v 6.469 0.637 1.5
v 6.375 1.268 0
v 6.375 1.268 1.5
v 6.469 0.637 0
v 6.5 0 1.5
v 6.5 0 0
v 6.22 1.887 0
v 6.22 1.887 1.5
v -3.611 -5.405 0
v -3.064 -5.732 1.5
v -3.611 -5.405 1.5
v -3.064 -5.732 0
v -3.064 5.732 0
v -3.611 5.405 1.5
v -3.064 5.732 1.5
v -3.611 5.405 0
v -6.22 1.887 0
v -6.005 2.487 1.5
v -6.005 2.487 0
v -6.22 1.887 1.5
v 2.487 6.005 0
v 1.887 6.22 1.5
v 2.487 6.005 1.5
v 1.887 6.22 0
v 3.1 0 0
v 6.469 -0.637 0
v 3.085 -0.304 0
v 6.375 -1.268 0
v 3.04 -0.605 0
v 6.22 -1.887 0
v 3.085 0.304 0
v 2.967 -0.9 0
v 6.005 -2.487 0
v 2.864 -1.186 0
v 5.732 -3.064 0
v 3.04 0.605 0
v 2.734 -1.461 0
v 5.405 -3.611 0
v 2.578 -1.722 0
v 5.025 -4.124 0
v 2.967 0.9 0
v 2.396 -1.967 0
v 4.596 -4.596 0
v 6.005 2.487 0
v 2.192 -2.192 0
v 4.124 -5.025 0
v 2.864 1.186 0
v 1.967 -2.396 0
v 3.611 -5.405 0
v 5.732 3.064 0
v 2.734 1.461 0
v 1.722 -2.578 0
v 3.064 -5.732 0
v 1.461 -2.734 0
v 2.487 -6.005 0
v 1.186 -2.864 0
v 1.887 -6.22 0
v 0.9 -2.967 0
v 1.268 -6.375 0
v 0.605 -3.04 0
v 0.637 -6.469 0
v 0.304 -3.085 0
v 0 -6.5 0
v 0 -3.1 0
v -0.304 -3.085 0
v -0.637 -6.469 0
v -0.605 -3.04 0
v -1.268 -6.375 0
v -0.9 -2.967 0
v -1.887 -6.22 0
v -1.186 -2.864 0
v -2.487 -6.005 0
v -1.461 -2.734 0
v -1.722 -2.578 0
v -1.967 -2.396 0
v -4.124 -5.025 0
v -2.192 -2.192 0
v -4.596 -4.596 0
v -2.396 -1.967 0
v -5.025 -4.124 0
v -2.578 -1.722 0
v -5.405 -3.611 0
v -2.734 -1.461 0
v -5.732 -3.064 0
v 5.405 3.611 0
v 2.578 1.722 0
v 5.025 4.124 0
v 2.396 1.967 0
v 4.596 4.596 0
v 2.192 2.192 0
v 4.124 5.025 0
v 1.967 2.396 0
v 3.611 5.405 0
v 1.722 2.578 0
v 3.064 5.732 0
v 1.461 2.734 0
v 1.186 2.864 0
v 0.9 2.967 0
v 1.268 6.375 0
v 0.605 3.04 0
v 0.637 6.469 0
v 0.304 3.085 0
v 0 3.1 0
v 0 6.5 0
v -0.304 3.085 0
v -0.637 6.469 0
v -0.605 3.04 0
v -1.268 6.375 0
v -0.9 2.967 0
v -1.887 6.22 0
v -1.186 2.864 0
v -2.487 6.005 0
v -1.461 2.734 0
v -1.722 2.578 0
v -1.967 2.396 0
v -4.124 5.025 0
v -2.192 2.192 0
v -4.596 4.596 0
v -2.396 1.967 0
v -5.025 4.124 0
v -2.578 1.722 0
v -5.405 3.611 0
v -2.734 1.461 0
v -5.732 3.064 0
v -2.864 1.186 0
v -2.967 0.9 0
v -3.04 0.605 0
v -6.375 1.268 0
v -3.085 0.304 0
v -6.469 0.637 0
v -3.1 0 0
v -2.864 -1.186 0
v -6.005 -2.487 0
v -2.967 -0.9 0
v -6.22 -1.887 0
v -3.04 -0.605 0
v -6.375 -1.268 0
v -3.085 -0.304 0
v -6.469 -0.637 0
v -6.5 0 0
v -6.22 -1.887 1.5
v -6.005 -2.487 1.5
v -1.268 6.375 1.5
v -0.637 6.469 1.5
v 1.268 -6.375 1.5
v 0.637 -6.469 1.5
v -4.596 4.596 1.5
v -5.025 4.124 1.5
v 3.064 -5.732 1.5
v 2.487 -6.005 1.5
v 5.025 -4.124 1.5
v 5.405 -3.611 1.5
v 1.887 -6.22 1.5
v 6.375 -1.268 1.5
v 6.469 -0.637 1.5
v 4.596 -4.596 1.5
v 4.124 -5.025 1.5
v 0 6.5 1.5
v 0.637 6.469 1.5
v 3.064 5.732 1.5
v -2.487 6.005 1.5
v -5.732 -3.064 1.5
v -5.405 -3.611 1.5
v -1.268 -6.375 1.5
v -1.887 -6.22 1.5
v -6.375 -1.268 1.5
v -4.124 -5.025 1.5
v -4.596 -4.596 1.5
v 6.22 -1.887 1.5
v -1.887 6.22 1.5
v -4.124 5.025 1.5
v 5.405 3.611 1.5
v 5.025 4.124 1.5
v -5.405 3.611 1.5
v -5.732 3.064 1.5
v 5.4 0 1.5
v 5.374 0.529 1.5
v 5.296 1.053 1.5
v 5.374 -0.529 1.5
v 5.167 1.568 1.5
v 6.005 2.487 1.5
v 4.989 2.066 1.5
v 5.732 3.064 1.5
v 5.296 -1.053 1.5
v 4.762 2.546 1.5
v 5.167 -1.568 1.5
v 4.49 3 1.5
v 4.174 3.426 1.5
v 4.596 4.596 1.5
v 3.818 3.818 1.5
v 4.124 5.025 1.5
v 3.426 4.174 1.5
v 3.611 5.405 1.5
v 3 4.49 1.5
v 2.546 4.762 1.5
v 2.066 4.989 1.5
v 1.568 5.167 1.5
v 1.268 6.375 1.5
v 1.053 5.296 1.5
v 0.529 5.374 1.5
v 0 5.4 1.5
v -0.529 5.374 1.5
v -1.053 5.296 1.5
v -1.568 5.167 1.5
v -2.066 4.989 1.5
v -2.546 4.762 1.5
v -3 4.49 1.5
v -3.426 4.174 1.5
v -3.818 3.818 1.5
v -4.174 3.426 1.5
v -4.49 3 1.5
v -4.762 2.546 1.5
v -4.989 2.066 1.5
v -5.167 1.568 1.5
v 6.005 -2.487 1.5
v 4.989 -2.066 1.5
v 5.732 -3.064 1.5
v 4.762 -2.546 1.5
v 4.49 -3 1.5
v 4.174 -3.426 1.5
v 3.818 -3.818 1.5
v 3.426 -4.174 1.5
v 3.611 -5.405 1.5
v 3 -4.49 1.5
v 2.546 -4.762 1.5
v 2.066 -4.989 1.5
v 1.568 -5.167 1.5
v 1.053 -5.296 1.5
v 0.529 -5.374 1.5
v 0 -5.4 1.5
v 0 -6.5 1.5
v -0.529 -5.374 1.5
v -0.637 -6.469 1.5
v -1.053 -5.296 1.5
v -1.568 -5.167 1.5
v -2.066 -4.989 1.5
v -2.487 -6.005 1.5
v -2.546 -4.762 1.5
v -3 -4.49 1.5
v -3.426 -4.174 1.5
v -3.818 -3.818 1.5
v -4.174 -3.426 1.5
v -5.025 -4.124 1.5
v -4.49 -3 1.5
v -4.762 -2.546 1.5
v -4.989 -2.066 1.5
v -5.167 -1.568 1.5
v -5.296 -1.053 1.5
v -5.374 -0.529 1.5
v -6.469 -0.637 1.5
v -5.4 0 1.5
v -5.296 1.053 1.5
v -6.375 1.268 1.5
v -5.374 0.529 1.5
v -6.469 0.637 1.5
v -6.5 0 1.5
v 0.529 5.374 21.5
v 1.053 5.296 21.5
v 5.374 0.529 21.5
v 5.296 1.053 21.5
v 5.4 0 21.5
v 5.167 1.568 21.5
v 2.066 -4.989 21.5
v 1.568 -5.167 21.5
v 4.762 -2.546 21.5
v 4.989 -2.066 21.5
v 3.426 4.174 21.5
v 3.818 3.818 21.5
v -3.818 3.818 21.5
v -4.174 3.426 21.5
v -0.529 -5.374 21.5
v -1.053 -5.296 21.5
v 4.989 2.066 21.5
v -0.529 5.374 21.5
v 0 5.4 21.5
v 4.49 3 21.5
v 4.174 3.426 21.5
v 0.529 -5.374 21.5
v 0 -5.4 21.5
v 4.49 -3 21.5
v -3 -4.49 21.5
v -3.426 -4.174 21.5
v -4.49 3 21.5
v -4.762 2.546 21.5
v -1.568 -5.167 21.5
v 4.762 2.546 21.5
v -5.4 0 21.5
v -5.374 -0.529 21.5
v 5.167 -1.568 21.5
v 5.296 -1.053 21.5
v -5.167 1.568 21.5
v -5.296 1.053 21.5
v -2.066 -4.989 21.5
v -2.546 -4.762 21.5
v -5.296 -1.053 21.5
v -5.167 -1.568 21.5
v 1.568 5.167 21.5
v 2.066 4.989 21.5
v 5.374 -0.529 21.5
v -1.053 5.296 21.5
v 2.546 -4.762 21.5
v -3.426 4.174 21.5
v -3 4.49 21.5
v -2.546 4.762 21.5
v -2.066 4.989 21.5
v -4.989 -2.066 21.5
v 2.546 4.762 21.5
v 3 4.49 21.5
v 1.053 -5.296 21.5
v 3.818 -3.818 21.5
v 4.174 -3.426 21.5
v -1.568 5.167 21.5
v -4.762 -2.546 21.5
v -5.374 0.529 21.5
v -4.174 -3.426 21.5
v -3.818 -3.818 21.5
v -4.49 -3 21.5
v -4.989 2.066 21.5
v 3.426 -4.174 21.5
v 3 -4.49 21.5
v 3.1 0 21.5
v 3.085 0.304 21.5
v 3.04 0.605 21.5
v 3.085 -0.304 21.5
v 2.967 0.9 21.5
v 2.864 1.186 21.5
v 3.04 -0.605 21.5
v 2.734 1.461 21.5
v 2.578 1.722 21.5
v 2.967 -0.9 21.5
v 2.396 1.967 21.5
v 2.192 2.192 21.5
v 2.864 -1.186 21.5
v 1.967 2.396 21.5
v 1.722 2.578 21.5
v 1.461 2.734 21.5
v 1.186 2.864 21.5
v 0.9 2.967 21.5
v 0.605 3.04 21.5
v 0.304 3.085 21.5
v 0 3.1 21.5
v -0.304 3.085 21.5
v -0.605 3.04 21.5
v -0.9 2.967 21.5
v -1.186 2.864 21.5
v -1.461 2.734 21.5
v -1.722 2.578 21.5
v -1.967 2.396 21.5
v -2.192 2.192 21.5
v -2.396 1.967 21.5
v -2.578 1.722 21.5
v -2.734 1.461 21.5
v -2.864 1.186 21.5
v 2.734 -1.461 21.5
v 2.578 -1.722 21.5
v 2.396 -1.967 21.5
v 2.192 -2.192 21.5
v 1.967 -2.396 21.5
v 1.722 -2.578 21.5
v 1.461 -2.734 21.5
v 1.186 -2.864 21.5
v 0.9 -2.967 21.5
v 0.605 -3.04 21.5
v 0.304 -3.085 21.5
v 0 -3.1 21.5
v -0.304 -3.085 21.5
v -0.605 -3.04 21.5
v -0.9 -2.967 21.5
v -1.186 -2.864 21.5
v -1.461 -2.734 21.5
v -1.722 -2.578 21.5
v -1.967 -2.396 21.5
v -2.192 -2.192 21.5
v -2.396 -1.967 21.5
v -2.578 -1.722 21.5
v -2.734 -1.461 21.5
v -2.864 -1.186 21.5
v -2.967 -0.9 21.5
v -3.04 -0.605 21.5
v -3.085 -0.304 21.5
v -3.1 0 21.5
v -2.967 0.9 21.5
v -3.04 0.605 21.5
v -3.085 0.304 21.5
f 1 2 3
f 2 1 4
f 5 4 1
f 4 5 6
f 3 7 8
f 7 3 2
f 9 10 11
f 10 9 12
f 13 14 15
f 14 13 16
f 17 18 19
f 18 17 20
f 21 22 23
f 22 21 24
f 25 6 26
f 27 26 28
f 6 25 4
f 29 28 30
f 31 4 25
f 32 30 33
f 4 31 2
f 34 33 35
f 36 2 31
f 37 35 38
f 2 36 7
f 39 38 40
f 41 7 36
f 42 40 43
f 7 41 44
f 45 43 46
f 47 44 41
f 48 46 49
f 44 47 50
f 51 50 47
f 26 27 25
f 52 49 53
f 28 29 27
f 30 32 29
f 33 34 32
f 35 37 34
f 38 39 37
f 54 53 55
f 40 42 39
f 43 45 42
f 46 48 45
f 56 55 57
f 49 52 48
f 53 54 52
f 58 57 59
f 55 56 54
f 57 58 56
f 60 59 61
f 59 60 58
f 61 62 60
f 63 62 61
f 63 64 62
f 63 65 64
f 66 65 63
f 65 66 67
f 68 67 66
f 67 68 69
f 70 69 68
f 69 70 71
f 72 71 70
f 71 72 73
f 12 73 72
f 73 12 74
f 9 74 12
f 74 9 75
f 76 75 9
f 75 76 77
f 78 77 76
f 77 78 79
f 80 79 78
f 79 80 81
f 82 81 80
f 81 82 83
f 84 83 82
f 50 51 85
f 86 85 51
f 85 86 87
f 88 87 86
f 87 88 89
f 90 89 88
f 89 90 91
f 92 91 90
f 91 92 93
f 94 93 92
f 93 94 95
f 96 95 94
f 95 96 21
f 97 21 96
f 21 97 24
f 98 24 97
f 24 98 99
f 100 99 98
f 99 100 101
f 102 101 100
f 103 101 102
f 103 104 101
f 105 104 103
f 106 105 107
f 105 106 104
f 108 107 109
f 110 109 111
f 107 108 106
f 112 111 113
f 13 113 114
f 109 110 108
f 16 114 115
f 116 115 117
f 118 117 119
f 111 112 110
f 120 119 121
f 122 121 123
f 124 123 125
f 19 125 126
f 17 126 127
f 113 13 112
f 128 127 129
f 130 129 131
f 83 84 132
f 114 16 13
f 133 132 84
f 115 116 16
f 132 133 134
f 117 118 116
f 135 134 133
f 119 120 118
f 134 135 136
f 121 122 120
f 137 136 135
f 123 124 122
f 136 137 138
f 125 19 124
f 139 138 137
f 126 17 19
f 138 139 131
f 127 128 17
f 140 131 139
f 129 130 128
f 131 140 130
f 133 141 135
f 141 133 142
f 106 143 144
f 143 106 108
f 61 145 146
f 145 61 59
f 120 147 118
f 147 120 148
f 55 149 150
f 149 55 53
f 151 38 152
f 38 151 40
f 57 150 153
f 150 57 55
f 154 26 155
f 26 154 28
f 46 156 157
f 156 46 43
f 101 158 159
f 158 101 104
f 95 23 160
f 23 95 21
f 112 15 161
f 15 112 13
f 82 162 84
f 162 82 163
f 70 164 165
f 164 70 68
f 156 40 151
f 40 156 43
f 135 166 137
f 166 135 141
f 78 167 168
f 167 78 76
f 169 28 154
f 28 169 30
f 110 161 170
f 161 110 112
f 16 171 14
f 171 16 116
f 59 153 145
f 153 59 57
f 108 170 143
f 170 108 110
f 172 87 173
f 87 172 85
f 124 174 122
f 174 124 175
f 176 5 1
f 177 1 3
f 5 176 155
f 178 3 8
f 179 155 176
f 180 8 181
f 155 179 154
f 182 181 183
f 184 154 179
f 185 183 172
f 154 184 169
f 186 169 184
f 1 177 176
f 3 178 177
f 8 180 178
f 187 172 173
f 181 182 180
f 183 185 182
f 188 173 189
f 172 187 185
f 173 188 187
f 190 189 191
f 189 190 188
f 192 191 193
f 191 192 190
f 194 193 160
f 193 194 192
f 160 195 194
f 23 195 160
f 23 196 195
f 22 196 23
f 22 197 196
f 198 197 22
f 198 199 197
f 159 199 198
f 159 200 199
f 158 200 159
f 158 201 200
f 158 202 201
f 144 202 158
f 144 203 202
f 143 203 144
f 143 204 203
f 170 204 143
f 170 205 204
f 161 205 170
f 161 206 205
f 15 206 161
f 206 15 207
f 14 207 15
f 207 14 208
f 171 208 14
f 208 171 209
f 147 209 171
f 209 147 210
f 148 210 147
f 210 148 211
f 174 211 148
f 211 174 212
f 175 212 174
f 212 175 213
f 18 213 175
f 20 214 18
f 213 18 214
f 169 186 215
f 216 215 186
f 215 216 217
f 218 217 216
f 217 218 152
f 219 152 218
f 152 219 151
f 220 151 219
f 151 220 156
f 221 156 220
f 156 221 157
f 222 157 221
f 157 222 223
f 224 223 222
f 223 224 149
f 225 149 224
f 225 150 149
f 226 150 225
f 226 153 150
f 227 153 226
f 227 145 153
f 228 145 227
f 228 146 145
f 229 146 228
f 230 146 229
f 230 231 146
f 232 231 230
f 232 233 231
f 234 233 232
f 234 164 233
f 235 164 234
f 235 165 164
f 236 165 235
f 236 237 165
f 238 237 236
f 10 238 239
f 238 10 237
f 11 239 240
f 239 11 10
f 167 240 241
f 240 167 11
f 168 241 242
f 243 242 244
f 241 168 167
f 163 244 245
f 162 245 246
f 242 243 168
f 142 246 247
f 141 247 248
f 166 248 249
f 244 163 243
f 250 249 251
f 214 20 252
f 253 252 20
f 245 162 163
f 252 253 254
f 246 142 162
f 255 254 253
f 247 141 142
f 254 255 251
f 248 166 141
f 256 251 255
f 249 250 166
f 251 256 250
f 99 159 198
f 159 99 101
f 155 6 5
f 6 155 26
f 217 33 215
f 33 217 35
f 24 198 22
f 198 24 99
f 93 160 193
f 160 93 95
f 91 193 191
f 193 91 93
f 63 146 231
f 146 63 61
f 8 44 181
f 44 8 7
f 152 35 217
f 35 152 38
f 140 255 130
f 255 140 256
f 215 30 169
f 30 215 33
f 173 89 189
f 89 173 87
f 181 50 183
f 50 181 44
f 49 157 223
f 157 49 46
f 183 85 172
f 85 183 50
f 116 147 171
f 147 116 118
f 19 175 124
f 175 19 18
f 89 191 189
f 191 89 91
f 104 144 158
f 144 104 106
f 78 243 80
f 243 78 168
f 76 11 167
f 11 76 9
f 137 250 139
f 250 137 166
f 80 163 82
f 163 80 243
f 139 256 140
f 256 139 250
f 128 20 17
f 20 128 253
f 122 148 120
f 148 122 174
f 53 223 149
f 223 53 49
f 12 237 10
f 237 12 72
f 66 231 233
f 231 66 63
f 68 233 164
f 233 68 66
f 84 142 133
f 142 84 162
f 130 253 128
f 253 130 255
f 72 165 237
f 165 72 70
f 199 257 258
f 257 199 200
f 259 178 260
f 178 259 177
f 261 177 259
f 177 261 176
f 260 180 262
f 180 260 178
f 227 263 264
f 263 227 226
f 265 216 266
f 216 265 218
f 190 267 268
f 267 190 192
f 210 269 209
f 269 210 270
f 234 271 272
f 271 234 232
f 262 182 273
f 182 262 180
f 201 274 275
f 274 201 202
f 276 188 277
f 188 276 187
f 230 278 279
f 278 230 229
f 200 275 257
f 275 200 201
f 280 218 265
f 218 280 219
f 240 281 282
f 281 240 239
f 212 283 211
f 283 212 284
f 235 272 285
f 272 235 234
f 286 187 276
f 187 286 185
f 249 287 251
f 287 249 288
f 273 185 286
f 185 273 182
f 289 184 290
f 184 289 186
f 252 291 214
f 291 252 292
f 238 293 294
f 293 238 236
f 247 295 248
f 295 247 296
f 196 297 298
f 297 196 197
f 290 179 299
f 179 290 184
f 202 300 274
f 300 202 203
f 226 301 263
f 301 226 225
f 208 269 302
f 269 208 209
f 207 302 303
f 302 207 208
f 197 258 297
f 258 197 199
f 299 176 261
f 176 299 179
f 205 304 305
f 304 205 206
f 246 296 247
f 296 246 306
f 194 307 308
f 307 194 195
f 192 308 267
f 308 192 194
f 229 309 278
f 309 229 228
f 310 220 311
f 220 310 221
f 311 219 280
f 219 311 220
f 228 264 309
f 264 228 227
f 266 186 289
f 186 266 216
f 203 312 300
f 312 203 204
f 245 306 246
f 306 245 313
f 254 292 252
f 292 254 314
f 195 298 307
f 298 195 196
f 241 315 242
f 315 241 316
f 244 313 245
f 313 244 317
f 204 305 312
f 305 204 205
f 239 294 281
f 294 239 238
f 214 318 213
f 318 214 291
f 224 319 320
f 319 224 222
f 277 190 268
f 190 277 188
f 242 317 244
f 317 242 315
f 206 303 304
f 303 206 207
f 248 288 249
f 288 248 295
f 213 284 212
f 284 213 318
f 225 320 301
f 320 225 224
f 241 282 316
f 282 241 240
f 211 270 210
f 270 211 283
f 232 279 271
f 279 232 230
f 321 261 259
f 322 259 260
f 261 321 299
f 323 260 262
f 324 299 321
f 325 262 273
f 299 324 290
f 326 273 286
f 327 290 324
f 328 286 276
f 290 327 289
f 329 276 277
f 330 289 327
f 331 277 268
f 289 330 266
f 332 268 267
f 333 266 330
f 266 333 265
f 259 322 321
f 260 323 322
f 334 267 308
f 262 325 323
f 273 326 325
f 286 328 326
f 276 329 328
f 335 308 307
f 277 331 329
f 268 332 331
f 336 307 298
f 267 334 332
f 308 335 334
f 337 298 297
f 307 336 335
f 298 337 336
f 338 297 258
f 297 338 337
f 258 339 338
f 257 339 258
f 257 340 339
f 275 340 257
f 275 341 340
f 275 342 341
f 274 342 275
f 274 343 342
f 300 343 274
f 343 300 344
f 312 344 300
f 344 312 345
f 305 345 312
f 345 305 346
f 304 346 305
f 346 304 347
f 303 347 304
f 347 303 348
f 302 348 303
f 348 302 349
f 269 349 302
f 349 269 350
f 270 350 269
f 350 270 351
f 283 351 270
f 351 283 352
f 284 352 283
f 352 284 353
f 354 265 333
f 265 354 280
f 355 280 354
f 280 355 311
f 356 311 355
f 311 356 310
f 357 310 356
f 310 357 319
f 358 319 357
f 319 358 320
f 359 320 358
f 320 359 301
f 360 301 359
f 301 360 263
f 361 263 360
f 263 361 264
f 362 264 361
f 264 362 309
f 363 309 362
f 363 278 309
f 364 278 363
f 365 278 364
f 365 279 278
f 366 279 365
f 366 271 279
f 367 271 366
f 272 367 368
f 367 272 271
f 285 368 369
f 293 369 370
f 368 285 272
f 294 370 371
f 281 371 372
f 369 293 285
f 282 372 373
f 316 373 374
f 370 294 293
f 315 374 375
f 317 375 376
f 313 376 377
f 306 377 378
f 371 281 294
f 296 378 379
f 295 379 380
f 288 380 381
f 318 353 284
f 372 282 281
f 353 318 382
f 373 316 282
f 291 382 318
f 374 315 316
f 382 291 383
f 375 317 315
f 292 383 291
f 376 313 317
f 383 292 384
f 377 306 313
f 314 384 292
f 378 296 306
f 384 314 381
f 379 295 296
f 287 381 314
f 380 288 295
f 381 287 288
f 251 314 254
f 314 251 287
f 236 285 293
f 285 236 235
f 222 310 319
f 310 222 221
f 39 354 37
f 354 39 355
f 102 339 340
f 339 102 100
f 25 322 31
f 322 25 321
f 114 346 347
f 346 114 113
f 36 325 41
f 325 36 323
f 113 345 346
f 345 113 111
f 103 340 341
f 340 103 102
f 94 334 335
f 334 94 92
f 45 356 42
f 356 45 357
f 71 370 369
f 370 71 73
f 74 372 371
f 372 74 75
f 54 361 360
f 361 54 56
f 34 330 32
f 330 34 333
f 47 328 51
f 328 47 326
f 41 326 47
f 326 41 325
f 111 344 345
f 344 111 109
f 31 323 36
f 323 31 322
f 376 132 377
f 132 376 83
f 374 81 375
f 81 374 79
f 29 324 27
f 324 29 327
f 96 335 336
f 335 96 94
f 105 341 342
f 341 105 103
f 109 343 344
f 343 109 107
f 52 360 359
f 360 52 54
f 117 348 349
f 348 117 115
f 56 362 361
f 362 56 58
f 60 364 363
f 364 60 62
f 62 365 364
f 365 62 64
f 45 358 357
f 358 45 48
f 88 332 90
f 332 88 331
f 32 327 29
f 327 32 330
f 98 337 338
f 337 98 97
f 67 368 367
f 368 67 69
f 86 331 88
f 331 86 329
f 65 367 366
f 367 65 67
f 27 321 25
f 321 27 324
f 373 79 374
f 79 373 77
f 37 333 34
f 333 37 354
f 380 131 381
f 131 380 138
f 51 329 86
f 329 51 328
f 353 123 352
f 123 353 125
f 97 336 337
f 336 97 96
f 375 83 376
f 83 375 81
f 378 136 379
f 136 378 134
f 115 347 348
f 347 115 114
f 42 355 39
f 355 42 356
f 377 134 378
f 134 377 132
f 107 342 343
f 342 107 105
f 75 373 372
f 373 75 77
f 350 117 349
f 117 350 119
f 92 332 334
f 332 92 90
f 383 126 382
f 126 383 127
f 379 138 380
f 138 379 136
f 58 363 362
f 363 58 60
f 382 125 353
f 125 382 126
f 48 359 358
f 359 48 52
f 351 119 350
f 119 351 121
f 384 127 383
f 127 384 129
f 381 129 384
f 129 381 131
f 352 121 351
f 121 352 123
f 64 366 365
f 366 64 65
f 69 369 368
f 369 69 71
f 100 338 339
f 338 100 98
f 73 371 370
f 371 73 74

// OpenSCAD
// PCR tube adapter sleeve - prints upside down
// Units: mm

$fn = 64;

// --- Dimensions ---
collar_d      = 13;    // collar outer diameter
collar_h      = 1.5;   // collar thickness (z = 0 to 1.5)
sleeve_od     = 10.8;  // sleeve body outer diameter
sleeve_top_z  = 21.5;  // top of sleeve body
bore_d        = 6.2;   // through-bore diameter
eps           = 0.5;   // cutter overshoot past faces

// Derived
sleeve_h = sleeve_top_z - collar_h;  // body height between collar and top

difference() {
    union() {
        // Collar
        cylinder(d = collar_d, h = collar_h);
        // Sleeve body (overlaps collar slightly to fuse solidly)
        translate([0, 0, collar_h - 0.01])
            cylinder(d = sleeve_od, h = sleeve_h + 0.01);
    }
    // Straight through-bore
    translate([0, 0, -eps])
        cylinder(d = bore_d, h = sleeve_top_z + eps);
}
